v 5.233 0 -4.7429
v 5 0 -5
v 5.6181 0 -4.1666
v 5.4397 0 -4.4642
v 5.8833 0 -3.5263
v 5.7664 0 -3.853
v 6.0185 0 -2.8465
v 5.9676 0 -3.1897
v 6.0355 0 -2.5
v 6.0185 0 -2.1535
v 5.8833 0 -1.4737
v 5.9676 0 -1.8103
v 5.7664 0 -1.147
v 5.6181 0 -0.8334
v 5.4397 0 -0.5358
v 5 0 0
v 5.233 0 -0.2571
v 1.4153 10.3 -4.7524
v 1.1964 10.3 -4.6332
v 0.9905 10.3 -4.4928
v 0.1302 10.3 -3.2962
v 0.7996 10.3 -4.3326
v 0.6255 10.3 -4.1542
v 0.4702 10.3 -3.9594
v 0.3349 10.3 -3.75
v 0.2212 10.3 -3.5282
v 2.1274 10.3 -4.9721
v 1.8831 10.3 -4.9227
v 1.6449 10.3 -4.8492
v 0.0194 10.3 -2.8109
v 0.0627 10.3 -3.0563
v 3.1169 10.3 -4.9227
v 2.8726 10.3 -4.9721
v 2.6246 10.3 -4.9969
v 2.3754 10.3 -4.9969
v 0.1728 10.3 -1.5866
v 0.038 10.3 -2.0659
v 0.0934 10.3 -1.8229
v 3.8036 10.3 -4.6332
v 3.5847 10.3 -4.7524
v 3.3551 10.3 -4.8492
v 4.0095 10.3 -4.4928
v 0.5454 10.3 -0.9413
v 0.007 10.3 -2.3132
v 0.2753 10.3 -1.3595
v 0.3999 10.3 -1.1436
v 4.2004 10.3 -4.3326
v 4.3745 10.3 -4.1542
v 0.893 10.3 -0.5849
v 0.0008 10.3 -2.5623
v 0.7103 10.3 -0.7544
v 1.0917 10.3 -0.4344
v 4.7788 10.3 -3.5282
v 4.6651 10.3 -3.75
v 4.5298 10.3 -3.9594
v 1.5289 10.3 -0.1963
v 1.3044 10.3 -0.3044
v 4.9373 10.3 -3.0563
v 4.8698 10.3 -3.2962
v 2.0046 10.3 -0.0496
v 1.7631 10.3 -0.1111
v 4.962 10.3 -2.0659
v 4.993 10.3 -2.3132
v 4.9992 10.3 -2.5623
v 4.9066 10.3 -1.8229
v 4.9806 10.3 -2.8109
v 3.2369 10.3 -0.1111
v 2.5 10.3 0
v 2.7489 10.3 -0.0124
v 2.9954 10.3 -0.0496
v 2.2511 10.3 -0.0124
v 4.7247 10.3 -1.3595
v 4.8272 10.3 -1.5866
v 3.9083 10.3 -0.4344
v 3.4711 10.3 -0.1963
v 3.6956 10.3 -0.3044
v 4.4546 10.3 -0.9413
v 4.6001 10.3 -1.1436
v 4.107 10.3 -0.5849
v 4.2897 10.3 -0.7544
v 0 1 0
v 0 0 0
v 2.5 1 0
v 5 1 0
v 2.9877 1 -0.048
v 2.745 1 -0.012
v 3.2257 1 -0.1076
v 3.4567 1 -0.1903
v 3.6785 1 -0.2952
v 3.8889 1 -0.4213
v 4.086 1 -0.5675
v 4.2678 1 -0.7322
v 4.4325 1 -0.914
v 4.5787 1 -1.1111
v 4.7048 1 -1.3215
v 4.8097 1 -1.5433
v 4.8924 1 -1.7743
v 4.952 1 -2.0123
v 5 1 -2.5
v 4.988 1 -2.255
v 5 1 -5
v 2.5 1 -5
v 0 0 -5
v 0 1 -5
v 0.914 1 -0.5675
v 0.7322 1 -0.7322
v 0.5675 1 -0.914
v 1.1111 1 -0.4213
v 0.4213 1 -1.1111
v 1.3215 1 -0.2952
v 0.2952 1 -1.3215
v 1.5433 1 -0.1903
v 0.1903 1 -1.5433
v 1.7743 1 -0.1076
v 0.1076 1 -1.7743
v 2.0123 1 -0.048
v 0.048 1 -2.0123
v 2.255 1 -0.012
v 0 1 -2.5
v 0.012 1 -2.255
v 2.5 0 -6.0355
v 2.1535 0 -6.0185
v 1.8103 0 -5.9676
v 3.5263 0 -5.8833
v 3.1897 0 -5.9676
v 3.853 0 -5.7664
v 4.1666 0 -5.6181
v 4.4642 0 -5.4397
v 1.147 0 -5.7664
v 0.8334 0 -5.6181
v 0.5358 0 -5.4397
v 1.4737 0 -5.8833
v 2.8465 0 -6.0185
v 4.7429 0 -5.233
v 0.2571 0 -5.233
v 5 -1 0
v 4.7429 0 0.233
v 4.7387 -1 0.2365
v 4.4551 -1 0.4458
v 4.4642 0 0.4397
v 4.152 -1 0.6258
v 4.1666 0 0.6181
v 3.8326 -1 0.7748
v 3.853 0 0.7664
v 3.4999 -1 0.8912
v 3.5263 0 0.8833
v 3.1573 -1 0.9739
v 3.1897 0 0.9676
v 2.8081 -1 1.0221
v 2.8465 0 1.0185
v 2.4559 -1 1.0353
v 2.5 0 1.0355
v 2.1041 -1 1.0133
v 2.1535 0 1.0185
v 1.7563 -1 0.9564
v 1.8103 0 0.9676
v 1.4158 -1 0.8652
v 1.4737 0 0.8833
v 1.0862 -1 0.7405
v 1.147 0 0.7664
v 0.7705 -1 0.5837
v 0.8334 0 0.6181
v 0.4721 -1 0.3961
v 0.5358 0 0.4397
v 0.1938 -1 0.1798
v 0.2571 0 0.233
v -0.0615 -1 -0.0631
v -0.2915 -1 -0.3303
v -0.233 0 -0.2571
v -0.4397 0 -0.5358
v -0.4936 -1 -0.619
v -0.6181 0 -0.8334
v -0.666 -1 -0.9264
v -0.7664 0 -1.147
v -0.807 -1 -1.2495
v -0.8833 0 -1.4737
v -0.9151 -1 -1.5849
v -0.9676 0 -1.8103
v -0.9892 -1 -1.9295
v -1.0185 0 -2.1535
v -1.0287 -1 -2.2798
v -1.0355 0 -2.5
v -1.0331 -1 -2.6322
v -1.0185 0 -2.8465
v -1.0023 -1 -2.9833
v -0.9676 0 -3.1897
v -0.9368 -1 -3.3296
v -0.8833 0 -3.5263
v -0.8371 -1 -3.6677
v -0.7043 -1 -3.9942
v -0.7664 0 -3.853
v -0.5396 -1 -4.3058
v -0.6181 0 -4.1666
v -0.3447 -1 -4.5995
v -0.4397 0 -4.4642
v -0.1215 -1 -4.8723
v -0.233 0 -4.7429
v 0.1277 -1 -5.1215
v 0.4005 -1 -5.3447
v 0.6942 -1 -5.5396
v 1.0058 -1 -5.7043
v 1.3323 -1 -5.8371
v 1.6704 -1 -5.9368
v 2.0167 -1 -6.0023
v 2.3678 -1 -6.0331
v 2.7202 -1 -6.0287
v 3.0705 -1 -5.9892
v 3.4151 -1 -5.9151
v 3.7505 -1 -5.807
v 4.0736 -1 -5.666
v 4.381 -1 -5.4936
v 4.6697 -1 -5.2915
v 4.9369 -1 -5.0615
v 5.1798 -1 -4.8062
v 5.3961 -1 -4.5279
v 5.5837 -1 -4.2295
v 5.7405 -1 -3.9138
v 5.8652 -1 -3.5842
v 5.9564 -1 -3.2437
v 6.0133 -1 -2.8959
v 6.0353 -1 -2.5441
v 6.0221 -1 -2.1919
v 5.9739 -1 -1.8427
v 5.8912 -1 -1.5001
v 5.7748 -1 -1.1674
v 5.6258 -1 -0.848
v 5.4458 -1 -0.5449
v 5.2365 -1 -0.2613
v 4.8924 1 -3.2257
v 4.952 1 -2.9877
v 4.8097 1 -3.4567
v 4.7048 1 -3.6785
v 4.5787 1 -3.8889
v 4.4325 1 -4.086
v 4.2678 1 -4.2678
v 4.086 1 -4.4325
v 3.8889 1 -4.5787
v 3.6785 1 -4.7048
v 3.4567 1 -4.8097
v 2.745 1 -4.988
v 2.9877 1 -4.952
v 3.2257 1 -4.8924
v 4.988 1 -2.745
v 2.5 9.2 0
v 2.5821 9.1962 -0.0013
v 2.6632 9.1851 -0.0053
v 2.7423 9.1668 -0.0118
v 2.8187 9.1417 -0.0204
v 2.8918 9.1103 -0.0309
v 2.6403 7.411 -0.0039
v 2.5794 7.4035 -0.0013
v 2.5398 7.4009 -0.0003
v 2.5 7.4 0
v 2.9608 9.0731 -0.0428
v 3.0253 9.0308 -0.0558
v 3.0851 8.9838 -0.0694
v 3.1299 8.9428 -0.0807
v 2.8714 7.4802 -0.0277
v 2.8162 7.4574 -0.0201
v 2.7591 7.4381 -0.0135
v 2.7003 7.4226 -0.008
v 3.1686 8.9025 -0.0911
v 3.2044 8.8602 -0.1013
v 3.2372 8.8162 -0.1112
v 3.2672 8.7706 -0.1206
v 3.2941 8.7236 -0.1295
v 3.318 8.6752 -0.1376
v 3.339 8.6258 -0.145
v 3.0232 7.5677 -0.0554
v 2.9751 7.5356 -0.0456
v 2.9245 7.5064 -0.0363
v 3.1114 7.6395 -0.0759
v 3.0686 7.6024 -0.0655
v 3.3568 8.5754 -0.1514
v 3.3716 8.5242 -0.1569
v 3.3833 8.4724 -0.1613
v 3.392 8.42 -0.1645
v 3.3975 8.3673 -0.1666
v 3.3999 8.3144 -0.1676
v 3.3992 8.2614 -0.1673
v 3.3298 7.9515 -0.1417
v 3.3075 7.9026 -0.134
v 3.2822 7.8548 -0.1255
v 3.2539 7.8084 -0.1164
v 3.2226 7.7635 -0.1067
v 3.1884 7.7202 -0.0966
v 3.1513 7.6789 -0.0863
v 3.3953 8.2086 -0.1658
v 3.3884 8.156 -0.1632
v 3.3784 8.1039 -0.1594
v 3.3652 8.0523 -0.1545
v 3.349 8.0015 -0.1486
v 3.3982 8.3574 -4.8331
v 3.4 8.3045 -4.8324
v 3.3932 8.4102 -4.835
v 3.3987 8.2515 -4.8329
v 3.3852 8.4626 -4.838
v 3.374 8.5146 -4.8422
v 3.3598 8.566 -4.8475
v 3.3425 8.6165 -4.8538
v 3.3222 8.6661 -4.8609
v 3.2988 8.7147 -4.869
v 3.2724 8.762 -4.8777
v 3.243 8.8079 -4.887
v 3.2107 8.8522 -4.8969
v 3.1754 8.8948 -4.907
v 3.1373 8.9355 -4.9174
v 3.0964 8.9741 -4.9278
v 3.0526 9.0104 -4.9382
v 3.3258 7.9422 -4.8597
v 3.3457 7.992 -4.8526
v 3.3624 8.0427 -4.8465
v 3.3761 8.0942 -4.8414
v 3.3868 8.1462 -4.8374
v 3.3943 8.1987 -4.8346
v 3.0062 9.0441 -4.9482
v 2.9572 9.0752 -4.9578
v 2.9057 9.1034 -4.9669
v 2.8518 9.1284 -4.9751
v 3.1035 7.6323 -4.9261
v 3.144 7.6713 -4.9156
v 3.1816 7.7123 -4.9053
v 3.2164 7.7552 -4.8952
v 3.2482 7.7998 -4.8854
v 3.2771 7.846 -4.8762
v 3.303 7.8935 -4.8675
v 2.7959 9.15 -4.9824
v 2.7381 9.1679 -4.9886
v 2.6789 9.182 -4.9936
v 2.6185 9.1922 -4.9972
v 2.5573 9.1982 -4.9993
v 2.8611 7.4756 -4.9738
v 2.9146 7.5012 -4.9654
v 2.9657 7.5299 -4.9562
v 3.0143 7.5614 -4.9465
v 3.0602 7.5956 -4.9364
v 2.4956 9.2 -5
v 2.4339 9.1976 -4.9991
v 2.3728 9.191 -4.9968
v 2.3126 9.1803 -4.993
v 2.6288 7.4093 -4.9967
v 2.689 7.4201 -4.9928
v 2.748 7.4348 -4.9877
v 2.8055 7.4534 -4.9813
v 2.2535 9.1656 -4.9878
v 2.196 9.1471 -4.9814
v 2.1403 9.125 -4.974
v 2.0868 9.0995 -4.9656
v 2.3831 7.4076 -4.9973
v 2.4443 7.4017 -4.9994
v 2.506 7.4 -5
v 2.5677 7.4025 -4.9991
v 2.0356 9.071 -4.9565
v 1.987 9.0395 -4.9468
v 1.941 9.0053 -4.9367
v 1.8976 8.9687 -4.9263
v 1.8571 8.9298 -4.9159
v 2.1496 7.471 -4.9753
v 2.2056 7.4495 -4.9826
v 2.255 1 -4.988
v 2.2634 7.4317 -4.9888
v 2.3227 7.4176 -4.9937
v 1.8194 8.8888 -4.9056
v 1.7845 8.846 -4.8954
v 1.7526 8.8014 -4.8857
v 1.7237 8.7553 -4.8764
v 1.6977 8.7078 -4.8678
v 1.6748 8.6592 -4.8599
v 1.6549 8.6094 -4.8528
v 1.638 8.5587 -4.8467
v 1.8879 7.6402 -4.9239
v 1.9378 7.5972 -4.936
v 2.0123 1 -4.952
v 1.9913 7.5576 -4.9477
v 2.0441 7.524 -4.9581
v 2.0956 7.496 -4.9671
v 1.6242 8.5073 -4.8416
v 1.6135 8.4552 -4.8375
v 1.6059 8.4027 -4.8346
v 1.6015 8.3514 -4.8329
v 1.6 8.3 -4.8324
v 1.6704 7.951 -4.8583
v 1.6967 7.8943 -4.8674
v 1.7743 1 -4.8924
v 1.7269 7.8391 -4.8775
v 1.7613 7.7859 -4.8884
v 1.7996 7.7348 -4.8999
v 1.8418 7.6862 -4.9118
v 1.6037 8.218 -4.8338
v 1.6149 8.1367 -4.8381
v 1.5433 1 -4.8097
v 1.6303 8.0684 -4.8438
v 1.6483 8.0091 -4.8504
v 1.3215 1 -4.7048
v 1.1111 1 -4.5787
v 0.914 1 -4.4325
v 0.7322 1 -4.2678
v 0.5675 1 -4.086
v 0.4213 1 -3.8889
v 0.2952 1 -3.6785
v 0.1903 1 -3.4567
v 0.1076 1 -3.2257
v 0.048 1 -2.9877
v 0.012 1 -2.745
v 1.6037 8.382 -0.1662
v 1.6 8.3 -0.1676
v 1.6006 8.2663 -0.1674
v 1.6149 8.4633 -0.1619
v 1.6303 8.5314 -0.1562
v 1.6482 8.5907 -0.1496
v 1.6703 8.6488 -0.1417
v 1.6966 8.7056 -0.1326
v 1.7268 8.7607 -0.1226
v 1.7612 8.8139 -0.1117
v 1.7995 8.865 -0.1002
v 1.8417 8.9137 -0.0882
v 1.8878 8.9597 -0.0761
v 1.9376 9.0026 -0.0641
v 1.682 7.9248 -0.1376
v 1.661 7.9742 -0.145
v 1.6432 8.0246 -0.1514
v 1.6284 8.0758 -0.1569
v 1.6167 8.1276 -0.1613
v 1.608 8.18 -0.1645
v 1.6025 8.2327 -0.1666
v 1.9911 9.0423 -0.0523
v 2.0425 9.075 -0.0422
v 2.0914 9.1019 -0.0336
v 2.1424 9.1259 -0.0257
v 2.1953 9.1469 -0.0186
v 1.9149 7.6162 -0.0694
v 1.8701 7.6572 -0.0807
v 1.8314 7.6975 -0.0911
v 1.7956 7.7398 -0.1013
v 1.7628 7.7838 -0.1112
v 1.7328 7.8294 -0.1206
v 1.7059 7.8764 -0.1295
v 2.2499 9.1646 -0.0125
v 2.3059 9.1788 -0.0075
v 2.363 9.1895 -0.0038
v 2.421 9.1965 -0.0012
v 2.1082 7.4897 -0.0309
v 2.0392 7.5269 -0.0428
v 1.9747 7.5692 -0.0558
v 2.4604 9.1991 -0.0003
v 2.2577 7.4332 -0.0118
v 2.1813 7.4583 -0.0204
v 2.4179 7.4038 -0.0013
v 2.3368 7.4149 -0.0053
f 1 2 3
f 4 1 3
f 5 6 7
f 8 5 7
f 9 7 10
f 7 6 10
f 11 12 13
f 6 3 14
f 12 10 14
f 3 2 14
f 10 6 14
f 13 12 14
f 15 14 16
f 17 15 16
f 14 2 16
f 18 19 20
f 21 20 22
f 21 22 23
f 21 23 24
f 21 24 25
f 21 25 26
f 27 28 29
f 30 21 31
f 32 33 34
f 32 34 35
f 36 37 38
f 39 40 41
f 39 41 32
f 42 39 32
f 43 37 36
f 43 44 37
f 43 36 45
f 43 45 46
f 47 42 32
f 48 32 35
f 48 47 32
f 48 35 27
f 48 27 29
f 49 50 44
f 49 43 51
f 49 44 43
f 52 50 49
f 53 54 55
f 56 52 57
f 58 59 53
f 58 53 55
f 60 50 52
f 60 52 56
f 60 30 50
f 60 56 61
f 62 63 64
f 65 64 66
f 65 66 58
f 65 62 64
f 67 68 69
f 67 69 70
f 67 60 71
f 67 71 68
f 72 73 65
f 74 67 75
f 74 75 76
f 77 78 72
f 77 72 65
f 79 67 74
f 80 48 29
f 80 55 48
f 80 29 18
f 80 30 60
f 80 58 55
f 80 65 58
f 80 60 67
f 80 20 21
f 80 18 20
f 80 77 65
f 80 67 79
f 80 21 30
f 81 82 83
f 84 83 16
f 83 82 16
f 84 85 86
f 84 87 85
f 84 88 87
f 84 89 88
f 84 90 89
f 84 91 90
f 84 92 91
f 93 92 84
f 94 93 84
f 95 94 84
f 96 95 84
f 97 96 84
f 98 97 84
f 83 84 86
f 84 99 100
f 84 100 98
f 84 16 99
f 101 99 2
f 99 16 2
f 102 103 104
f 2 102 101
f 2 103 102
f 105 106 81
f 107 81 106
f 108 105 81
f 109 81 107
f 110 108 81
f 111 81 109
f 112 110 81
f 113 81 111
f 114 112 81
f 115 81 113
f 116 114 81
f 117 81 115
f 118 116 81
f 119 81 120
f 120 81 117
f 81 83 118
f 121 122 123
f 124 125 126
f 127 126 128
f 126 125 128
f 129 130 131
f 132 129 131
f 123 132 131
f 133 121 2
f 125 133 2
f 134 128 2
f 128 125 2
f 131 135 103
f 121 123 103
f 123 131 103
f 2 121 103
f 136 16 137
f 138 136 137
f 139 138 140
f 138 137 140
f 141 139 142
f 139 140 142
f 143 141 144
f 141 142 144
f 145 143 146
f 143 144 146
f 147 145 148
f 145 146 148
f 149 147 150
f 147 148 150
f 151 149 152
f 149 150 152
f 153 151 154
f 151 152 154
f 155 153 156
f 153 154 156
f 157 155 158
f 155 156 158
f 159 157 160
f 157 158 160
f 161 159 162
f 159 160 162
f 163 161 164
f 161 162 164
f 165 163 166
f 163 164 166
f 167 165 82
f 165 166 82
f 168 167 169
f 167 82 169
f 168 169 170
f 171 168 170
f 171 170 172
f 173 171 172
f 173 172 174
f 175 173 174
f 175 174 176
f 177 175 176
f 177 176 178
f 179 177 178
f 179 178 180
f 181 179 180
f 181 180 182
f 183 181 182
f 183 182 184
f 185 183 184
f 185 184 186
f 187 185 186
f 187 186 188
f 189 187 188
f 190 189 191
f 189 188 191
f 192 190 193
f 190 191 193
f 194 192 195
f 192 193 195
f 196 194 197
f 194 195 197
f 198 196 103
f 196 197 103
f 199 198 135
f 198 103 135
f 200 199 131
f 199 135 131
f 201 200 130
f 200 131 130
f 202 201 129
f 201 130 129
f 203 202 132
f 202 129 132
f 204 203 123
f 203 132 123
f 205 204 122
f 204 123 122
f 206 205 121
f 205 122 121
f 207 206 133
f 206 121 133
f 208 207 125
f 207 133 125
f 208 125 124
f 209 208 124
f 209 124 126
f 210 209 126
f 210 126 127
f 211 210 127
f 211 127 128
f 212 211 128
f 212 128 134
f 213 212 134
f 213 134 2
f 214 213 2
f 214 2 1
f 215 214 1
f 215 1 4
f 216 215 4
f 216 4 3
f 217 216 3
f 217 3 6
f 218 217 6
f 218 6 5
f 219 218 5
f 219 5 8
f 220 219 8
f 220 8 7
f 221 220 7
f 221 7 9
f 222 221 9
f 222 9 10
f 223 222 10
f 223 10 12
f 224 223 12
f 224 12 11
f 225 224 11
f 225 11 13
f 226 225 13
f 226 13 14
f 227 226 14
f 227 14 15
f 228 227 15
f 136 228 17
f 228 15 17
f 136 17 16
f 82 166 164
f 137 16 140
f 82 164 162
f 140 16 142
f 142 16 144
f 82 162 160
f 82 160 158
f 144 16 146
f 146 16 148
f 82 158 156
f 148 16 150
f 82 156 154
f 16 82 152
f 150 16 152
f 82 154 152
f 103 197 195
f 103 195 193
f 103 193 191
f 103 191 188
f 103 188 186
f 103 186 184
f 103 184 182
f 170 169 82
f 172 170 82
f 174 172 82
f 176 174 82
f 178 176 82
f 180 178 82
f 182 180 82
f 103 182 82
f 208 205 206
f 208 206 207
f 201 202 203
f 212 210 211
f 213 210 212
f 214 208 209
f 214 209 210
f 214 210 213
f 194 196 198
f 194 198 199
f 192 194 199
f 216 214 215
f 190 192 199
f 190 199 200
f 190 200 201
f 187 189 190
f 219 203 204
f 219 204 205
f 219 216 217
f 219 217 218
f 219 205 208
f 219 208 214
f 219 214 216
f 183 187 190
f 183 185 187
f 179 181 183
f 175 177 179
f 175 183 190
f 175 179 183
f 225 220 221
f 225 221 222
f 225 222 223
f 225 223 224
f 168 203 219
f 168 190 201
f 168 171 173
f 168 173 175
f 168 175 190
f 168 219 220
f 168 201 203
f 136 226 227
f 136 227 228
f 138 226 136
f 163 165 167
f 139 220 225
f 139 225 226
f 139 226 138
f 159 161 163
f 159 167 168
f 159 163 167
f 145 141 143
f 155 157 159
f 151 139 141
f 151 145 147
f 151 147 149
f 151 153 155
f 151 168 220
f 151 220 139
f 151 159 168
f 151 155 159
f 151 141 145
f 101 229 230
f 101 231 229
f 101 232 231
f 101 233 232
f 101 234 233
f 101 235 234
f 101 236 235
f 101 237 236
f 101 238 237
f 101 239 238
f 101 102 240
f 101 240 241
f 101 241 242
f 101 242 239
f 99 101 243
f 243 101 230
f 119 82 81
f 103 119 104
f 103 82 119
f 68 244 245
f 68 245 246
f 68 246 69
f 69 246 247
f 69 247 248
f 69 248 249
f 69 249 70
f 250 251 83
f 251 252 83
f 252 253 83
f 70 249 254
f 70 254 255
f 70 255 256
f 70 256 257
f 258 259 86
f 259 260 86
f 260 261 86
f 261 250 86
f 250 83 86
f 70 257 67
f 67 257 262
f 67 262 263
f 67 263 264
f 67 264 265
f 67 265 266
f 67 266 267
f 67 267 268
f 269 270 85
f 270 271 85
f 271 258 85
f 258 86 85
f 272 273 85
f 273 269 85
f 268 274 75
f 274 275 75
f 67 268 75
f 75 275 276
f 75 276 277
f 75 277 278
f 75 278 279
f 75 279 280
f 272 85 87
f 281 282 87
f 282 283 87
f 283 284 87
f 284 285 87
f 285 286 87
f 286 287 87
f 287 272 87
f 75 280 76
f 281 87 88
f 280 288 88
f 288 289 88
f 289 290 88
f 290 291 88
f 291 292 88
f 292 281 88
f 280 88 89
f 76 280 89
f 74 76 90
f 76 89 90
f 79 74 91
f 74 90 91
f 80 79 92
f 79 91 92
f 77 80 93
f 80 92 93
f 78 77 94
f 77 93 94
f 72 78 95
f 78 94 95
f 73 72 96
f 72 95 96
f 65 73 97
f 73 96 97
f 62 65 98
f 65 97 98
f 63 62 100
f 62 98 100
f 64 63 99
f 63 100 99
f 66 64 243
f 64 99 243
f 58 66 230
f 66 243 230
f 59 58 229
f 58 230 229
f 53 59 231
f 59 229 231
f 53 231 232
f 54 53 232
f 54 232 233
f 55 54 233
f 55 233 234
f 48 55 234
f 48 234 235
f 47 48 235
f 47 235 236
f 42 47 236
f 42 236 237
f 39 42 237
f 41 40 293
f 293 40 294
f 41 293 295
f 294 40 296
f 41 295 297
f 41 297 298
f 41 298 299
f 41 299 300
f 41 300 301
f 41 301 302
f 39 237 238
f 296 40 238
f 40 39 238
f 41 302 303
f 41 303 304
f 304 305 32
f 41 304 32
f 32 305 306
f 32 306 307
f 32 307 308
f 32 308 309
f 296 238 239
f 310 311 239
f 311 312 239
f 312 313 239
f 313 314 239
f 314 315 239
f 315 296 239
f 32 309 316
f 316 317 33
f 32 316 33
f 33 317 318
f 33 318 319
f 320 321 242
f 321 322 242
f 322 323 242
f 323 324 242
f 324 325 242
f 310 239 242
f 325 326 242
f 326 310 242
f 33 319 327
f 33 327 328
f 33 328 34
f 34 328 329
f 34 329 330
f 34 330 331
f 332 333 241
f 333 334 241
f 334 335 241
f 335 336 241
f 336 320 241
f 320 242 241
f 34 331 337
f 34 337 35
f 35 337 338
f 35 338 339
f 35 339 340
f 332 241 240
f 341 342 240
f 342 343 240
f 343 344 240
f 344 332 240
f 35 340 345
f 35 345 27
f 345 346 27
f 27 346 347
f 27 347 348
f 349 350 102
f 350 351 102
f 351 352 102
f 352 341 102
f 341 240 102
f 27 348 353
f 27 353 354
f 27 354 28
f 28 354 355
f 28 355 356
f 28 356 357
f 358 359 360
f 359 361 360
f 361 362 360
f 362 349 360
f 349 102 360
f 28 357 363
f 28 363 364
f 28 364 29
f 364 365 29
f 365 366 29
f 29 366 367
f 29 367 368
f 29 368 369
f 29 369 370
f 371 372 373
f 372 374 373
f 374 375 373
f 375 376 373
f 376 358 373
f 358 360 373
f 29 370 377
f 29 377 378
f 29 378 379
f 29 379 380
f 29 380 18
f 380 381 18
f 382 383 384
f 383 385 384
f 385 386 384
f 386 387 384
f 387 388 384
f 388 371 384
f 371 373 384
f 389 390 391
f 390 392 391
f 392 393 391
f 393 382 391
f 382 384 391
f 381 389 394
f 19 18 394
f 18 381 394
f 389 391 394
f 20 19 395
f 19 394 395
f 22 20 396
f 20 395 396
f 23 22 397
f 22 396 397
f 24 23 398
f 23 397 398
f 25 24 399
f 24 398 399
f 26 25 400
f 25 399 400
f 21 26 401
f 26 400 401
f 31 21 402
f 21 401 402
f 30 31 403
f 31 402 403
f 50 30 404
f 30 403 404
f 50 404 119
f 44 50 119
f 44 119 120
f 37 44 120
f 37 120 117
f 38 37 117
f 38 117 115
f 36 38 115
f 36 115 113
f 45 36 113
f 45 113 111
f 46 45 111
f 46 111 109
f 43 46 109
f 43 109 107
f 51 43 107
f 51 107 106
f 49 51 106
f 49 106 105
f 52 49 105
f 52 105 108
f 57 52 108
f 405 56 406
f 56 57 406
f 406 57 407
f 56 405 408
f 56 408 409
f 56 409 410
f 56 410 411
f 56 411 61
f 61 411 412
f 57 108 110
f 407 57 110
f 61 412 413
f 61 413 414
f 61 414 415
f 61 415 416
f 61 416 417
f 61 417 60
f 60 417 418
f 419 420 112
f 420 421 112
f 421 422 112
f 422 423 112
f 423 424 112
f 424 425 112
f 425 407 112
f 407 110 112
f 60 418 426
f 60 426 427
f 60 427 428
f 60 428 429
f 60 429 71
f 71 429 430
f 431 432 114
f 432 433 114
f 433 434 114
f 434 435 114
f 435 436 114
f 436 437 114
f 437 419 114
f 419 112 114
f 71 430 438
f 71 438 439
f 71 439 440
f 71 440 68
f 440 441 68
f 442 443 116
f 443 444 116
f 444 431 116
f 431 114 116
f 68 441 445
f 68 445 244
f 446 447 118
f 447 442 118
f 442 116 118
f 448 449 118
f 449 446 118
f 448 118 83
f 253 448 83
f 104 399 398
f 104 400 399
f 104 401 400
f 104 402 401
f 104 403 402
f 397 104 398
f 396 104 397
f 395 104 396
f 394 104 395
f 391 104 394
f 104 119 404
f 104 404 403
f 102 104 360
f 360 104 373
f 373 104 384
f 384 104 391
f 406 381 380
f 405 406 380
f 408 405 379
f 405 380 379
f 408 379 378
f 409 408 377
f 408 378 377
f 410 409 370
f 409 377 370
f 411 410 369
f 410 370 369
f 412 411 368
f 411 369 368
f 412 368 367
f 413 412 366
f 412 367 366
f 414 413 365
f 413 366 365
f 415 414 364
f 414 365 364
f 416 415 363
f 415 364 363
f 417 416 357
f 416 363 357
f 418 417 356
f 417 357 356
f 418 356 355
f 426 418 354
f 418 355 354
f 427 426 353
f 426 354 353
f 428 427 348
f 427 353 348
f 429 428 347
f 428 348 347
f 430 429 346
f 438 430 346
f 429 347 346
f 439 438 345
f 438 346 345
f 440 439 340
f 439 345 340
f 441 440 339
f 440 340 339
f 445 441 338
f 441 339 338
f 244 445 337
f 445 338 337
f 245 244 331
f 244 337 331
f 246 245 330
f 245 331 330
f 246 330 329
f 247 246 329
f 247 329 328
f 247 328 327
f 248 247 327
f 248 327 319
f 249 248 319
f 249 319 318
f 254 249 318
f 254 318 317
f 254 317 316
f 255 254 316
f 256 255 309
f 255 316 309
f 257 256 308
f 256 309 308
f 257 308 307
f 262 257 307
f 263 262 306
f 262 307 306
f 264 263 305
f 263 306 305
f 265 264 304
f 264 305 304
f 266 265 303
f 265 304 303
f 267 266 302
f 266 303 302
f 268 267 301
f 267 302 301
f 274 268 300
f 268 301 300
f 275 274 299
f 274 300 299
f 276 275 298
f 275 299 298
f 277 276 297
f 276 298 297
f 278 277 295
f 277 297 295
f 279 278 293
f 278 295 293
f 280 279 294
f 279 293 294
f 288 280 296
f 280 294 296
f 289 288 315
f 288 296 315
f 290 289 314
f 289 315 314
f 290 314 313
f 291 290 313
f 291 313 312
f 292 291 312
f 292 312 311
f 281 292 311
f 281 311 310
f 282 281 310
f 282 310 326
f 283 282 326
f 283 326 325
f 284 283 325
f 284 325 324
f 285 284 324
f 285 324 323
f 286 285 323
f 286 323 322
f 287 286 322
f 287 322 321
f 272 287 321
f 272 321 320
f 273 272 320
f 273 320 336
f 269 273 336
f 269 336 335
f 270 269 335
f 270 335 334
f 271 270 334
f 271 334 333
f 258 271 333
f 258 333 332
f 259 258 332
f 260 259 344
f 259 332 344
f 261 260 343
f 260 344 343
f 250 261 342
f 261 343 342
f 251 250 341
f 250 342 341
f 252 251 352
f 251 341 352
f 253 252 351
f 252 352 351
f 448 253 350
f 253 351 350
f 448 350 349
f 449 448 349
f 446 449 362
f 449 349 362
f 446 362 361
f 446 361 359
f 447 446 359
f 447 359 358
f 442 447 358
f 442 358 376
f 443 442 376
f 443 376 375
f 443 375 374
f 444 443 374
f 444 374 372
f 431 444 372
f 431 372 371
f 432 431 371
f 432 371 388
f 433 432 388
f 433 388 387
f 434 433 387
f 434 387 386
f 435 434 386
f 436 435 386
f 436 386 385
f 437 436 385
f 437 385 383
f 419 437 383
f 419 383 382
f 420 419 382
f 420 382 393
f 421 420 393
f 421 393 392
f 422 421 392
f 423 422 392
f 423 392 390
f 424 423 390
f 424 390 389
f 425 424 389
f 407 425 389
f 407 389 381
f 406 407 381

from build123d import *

# Parameters (mm, degrees)
SKETCH_3_W          = 5
SKETCH_3_H          = 5
EXTRUDE_2_DEPTH     = 1
SKETCH_4_R          = 3.535533906
EXTRUDE_3_DEPTH     = 1
SKETCH_5_R          = 2.5
EXTRUDE_4_DEPTH     = 9.3
CUT_EXTRUDE_1_REACH = 15.377
SKETCH_7_R          = 0.9


with BuildPart() as part:
    # 草图3 → 凸台-拉伸2 (new body)
    with BuildSketch(Plane(origin=(0, 0, 0), x_dir=(1, 0, 0), z_dir=(0, 1, 0))):
        with Locations((2.5, 2.5)):
            Rectangle(SKETCH_3_W, SKETCH_3_H)
    extrude(amount=EXTRUDE_2_DEPTH)

    # 草图4 → 凸台-拉伸3 (add)
    with BuildSketch(Plane.XZ):
        with Locations(Location((2.5, -2.5, 0), (0, 0, 45))):
            Circle(SKETCH_4_R)
    extrude(amount=EXTRUDE_3_DEPTH)

    # 草图5 → 凸台-拉伸4 (add)
    with BuildSketch(Plane(origin=(0, 1, 0), x_dir=(1, 0, 0), z_dir=(0, 1, 0))):
        with Locations(Location((2.5, 2.5, 0), (0, 0, 270))):
            Circle(SKETCH_5_R)
    extrude(amount=EXTRUDE_4_DEPTH)

    # 草图7 → 切除-拉伸1 (cut, up to next)
    with BuildSketch(Plane(origin=(0, 0, -5), x_dir=(-1, 0, 0), z_dir=(0, 0, -1)), mode=Mode.PRIVATE) as cut_extrude_1_sk1:
        with Locations((-2.5, 8.3)):
            Circle(SKETCH_7_R)
    cut_extrude_1_tool1 = extrude(cut_extrude_1_sk1.sketch, amount=-CUT_EXTRUDE_1_REACH, mode=Mode.PRIVATE) & part.part
    add(cut_extrude_1_tool1.solids().sort_by_distance((2.5, 8.3, -5))[0], mode=Mode.SUBTRACT)


solid = part.part
